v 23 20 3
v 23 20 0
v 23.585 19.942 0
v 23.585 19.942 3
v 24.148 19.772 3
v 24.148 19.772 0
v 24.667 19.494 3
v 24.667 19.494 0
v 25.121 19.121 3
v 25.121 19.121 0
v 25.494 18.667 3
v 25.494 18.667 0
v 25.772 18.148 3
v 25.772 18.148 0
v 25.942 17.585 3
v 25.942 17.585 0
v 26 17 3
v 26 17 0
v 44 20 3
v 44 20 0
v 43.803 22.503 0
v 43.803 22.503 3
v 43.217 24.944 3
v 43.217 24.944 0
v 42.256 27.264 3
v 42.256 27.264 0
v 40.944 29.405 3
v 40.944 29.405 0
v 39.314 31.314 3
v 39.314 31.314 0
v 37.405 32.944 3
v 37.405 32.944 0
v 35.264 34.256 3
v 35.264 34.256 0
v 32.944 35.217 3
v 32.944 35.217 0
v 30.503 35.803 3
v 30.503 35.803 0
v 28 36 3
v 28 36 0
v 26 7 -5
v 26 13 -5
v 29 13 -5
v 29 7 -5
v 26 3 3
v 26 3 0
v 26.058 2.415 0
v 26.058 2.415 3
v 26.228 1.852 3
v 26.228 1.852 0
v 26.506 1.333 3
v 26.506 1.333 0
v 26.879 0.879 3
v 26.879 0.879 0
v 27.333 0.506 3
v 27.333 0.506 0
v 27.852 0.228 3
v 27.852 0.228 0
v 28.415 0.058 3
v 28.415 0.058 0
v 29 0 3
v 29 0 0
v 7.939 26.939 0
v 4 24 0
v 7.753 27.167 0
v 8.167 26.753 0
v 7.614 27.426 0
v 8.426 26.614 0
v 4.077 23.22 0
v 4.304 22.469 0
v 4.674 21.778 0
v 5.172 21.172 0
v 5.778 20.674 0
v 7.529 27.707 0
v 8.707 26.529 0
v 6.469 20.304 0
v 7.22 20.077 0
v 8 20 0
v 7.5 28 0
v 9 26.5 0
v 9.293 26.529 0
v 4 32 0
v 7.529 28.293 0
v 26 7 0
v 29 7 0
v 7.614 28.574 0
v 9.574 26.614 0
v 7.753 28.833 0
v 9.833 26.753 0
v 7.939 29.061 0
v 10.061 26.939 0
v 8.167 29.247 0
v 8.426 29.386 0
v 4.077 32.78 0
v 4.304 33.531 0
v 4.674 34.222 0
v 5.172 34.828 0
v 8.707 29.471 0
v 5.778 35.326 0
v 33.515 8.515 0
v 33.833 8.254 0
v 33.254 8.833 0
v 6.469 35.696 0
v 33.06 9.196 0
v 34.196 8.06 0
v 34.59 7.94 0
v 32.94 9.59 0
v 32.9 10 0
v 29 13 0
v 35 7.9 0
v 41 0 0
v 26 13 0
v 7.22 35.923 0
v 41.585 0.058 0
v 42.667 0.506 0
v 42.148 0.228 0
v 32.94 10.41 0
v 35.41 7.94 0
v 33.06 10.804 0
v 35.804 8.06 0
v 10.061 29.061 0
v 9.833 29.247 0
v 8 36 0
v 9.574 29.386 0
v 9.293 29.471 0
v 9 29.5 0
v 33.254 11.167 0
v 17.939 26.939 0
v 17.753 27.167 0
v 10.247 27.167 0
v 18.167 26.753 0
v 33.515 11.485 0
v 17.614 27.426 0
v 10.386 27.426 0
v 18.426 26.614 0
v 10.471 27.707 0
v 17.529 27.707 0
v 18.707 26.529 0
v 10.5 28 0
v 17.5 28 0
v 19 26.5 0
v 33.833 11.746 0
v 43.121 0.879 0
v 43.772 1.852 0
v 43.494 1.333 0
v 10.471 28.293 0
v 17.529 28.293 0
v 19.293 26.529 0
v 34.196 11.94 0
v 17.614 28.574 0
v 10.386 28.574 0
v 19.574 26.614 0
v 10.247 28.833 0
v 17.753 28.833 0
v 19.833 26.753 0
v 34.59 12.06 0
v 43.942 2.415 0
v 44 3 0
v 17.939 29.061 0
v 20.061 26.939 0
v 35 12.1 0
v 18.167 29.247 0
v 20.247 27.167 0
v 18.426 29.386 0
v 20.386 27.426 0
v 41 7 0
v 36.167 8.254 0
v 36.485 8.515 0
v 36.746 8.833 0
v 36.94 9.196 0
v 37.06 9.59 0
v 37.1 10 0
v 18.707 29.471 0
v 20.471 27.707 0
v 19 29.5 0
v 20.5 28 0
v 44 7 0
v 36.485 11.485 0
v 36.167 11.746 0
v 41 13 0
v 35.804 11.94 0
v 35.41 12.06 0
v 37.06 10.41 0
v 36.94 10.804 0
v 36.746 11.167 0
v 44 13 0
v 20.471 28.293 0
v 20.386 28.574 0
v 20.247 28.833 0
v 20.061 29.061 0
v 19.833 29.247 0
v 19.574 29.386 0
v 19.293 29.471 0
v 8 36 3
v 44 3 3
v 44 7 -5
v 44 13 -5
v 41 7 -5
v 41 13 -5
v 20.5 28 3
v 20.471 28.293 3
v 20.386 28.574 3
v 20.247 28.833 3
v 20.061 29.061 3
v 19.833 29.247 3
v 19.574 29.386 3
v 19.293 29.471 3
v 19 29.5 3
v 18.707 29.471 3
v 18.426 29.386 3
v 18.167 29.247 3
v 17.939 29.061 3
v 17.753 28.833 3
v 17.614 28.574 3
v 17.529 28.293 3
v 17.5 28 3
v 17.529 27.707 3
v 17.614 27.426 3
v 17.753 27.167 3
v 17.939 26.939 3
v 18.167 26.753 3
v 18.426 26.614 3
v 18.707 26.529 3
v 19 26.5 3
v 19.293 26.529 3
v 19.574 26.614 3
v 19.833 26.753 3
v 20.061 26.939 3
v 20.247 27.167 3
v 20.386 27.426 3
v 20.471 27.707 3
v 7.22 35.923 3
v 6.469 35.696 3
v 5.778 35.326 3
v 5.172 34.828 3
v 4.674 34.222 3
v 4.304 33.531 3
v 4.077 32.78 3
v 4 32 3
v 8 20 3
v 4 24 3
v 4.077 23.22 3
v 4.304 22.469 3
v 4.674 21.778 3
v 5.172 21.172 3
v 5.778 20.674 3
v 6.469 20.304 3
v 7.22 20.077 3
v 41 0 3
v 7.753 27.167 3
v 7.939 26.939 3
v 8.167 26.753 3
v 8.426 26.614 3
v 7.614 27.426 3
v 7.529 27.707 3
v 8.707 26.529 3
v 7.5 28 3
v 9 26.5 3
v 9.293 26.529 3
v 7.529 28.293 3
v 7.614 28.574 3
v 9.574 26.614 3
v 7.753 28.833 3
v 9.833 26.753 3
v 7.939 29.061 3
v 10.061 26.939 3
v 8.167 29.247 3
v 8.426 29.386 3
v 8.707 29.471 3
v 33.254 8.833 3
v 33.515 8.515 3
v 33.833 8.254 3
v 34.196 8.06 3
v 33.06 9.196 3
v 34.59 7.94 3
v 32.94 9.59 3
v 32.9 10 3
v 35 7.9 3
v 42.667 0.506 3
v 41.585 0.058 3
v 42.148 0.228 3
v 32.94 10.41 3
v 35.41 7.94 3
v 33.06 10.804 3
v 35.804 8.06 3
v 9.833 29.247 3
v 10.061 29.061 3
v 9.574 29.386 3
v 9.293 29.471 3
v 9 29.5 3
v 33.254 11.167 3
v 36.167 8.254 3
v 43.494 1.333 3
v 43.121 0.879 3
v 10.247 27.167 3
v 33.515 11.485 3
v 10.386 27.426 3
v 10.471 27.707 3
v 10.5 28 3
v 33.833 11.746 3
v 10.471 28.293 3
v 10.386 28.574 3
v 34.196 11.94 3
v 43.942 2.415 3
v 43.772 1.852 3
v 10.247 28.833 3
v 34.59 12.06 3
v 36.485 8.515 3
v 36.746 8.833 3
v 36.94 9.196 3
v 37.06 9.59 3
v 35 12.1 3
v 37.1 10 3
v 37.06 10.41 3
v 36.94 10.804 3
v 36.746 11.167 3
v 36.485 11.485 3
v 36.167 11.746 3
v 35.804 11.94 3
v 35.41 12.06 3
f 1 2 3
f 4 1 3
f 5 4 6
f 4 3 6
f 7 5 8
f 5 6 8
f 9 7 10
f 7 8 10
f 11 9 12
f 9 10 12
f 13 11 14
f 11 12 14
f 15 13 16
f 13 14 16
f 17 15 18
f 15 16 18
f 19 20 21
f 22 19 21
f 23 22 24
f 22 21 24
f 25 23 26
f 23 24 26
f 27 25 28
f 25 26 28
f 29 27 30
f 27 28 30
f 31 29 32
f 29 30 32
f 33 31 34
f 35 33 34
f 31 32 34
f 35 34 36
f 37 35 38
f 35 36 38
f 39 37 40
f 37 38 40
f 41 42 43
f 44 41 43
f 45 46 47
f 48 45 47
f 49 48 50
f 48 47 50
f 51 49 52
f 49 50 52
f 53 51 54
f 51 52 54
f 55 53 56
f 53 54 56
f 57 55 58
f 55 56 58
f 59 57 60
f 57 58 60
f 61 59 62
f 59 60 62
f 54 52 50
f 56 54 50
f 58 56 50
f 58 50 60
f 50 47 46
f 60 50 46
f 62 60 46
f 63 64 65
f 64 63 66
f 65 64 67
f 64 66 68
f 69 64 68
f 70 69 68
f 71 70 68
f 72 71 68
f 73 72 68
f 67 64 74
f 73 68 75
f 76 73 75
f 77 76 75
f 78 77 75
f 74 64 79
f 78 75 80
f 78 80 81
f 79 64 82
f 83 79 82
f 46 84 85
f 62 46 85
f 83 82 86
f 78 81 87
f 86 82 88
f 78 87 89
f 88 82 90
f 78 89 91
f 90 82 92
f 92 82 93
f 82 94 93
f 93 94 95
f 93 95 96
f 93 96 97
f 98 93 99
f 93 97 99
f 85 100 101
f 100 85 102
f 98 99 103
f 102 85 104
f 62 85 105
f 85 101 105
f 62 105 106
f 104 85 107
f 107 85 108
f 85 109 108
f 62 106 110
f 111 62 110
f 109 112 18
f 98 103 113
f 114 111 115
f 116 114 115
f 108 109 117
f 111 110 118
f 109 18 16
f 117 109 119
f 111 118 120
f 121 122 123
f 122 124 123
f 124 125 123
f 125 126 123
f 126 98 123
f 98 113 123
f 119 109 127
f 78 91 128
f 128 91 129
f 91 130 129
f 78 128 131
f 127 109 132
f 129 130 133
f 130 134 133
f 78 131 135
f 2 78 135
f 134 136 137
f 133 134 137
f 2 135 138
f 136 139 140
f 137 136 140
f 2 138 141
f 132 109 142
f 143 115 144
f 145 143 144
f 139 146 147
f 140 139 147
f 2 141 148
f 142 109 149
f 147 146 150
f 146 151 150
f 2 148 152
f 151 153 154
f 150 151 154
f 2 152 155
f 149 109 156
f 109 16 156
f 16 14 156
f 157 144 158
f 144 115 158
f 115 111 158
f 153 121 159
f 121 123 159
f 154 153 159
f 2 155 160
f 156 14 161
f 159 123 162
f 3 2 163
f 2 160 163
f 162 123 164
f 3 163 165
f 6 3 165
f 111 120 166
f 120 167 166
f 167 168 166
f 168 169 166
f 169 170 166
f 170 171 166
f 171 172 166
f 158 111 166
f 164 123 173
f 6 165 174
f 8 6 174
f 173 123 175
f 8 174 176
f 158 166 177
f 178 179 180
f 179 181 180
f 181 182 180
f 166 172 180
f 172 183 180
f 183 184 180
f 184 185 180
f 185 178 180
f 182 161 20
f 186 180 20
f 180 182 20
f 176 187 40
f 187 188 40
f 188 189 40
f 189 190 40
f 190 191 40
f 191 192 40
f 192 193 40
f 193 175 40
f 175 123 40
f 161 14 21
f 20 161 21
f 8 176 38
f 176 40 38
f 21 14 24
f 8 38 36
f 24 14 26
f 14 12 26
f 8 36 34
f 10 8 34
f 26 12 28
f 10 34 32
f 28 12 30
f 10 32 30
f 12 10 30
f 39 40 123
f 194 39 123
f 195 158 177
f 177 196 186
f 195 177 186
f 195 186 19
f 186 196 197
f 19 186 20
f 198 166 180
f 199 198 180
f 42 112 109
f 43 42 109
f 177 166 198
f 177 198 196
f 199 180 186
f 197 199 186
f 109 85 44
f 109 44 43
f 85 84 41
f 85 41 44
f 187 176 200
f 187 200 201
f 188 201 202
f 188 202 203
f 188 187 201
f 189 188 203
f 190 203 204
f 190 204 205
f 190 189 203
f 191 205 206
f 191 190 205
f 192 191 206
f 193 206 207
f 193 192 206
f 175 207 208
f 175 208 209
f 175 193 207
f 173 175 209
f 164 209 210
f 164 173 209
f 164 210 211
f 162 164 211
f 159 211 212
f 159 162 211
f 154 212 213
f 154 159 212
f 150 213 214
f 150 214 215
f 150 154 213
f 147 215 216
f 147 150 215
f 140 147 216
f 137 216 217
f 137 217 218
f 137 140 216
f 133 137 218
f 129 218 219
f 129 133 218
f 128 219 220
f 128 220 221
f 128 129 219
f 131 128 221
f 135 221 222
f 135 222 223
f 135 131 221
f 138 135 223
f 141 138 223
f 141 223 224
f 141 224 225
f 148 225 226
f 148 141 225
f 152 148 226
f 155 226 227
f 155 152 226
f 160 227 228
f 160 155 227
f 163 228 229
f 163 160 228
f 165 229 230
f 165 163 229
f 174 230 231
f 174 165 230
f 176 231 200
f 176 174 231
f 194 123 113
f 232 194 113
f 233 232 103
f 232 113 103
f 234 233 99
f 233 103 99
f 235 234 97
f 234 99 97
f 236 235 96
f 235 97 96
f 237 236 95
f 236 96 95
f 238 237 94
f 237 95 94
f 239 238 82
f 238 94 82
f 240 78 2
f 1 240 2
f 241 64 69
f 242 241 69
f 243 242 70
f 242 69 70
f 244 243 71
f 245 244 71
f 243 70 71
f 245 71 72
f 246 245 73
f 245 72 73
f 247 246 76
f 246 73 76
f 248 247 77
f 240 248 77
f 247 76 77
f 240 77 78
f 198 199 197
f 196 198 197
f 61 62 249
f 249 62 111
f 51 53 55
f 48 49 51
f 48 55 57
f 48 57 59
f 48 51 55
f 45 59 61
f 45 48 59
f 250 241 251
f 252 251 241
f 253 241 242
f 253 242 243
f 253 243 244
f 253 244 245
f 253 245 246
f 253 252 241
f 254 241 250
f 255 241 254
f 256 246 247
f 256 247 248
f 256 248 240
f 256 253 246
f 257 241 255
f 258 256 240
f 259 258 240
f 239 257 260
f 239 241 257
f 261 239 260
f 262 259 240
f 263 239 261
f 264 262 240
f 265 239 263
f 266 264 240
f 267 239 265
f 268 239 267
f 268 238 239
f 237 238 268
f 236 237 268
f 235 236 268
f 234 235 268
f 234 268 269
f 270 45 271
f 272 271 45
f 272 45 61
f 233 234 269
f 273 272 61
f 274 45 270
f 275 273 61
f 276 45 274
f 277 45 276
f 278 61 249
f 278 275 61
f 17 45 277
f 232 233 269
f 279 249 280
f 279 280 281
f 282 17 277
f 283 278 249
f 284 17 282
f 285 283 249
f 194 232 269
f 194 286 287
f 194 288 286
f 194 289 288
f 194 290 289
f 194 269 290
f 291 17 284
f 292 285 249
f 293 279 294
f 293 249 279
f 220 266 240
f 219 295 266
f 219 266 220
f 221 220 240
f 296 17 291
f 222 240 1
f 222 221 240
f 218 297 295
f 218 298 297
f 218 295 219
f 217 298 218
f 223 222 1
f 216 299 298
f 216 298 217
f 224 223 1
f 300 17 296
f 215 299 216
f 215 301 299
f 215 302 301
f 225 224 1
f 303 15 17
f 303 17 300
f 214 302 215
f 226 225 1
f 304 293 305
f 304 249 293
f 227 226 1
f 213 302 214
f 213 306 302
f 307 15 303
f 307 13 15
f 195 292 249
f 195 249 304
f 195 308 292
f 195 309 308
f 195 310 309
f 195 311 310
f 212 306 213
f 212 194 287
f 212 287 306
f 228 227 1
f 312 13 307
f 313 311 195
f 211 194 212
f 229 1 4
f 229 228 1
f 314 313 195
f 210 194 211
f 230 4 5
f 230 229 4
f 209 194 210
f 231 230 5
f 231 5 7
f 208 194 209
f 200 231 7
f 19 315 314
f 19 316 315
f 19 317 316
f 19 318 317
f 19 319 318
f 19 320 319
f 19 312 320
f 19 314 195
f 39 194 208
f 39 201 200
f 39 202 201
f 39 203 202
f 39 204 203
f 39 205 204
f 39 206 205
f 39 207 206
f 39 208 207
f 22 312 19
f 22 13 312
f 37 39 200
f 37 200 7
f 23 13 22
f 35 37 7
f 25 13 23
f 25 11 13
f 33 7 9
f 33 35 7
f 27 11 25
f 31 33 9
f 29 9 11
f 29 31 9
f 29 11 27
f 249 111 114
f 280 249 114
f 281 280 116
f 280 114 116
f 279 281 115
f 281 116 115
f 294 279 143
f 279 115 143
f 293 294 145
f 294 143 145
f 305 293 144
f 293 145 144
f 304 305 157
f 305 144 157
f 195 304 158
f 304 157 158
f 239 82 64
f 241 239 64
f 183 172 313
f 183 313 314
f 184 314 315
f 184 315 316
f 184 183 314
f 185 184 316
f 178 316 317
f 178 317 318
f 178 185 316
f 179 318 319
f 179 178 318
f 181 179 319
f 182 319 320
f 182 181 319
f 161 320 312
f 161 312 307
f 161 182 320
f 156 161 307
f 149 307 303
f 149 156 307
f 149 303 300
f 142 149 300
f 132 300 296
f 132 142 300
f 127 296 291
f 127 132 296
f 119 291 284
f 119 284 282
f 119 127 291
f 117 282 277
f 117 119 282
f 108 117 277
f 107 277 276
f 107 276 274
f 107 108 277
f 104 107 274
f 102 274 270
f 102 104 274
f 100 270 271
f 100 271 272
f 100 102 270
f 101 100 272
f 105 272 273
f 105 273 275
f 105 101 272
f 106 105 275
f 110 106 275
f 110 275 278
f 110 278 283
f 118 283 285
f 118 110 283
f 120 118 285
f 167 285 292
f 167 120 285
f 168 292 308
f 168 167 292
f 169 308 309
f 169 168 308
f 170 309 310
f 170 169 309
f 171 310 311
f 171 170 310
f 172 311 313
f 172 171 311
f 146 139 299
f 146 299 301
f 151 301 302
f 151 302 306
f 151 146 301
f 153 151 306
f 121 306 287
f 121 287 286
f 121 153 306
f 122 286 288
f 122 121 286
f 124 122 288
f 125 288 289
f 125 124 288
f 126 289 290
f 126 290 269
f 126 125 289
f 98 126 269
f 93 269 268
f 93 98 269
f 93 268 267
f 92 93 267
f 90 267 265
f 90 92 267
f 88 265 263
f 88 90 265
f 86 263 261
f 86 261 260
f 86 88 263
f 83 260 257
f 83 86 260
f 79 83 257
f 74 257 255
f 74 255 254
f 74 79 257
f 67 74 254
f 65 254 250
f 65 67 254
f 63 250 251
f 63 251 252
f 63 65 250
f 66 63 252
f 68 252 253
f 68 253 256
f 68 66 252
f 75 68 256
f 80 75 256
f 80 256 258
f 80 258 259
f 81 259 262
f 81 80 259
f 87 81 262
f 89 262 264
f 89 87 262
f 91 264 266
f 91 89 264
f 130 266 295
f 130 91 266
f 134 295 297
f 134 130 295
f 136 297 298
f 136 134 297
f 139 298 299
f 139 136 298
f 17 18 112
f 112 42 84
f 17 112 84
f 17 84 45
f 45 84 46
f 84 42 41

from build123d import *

# Parameters (mm, degrees)
SKETCH_1_R      = 2.1
SKETCH_1_R_2    = 1.5
EXTRUDE_1_DEPTH = 3
SKETCH_1_3_W    = 3
SKETCH_1_3_H    = 6
EXTRUDE_2_DEPTH = 5


with BuildPart() as part:
    # 草图1 → 凸台-拉伸1 (new body)
    with BuildSketch(Plane.XY):
        with BuildLine():
            Line((28, 36), (8, 36))
            ThreePointArc((8, 36), (5.171572875, 34.828427125), (4, 32))
            Line((4, 32), (4, 24))
            ThreePointArc((4, 24), (5.171572875, 21.171572875), (8, 20))
            Line((8, 20), (23, 20))
            ThreePointArc((23, 20), (25.121320344, 19.121320344), (26, 17))
            Line((26, 17), (26, 3))
            ThreePointArc((26, 3), (26.878679656, 0.878679656), (29, 0))
            Line((29, 0), (41, 0))
            ThreePointArc((41, 0), (43.121320344, 0.878679656), (44, 3))
            Line((44, 3), (44, 20))
            ThreePointArc((44, 20), (39.313708499, 31.313708499), (28, 36))
        make_face()
        with Locations((35, 10)):
            Circle(SKETCH_1_R, mode=Mode.SUBTRACT)
        with Locations((9, 28)):
            Circle(SKETCH_1_R_2, mode=Mode.SUBTRACT)
        with Locations((19, 28)):
            Circle(SKETCH_1_R_2, mode=Mode.SUBTRACT)
    extrude(amount=EXTRUDE_1_DEPTH)

    # 草图1<3> → 凸台-拉伸2 (add)
    with BuildSketch(Plane.XY):
        with Locations((42.5, 10)):
            Rectangle(SKETCH_1_3_W, SKETCH_1_3_H)
        with Locations((27.5, 10)):
            Rectangle(SKETCH_1_3_W, SKETCH_1_3_H)
    extrude(amount=-EXTRUDE_2_DEPTH)


solid = part.part
